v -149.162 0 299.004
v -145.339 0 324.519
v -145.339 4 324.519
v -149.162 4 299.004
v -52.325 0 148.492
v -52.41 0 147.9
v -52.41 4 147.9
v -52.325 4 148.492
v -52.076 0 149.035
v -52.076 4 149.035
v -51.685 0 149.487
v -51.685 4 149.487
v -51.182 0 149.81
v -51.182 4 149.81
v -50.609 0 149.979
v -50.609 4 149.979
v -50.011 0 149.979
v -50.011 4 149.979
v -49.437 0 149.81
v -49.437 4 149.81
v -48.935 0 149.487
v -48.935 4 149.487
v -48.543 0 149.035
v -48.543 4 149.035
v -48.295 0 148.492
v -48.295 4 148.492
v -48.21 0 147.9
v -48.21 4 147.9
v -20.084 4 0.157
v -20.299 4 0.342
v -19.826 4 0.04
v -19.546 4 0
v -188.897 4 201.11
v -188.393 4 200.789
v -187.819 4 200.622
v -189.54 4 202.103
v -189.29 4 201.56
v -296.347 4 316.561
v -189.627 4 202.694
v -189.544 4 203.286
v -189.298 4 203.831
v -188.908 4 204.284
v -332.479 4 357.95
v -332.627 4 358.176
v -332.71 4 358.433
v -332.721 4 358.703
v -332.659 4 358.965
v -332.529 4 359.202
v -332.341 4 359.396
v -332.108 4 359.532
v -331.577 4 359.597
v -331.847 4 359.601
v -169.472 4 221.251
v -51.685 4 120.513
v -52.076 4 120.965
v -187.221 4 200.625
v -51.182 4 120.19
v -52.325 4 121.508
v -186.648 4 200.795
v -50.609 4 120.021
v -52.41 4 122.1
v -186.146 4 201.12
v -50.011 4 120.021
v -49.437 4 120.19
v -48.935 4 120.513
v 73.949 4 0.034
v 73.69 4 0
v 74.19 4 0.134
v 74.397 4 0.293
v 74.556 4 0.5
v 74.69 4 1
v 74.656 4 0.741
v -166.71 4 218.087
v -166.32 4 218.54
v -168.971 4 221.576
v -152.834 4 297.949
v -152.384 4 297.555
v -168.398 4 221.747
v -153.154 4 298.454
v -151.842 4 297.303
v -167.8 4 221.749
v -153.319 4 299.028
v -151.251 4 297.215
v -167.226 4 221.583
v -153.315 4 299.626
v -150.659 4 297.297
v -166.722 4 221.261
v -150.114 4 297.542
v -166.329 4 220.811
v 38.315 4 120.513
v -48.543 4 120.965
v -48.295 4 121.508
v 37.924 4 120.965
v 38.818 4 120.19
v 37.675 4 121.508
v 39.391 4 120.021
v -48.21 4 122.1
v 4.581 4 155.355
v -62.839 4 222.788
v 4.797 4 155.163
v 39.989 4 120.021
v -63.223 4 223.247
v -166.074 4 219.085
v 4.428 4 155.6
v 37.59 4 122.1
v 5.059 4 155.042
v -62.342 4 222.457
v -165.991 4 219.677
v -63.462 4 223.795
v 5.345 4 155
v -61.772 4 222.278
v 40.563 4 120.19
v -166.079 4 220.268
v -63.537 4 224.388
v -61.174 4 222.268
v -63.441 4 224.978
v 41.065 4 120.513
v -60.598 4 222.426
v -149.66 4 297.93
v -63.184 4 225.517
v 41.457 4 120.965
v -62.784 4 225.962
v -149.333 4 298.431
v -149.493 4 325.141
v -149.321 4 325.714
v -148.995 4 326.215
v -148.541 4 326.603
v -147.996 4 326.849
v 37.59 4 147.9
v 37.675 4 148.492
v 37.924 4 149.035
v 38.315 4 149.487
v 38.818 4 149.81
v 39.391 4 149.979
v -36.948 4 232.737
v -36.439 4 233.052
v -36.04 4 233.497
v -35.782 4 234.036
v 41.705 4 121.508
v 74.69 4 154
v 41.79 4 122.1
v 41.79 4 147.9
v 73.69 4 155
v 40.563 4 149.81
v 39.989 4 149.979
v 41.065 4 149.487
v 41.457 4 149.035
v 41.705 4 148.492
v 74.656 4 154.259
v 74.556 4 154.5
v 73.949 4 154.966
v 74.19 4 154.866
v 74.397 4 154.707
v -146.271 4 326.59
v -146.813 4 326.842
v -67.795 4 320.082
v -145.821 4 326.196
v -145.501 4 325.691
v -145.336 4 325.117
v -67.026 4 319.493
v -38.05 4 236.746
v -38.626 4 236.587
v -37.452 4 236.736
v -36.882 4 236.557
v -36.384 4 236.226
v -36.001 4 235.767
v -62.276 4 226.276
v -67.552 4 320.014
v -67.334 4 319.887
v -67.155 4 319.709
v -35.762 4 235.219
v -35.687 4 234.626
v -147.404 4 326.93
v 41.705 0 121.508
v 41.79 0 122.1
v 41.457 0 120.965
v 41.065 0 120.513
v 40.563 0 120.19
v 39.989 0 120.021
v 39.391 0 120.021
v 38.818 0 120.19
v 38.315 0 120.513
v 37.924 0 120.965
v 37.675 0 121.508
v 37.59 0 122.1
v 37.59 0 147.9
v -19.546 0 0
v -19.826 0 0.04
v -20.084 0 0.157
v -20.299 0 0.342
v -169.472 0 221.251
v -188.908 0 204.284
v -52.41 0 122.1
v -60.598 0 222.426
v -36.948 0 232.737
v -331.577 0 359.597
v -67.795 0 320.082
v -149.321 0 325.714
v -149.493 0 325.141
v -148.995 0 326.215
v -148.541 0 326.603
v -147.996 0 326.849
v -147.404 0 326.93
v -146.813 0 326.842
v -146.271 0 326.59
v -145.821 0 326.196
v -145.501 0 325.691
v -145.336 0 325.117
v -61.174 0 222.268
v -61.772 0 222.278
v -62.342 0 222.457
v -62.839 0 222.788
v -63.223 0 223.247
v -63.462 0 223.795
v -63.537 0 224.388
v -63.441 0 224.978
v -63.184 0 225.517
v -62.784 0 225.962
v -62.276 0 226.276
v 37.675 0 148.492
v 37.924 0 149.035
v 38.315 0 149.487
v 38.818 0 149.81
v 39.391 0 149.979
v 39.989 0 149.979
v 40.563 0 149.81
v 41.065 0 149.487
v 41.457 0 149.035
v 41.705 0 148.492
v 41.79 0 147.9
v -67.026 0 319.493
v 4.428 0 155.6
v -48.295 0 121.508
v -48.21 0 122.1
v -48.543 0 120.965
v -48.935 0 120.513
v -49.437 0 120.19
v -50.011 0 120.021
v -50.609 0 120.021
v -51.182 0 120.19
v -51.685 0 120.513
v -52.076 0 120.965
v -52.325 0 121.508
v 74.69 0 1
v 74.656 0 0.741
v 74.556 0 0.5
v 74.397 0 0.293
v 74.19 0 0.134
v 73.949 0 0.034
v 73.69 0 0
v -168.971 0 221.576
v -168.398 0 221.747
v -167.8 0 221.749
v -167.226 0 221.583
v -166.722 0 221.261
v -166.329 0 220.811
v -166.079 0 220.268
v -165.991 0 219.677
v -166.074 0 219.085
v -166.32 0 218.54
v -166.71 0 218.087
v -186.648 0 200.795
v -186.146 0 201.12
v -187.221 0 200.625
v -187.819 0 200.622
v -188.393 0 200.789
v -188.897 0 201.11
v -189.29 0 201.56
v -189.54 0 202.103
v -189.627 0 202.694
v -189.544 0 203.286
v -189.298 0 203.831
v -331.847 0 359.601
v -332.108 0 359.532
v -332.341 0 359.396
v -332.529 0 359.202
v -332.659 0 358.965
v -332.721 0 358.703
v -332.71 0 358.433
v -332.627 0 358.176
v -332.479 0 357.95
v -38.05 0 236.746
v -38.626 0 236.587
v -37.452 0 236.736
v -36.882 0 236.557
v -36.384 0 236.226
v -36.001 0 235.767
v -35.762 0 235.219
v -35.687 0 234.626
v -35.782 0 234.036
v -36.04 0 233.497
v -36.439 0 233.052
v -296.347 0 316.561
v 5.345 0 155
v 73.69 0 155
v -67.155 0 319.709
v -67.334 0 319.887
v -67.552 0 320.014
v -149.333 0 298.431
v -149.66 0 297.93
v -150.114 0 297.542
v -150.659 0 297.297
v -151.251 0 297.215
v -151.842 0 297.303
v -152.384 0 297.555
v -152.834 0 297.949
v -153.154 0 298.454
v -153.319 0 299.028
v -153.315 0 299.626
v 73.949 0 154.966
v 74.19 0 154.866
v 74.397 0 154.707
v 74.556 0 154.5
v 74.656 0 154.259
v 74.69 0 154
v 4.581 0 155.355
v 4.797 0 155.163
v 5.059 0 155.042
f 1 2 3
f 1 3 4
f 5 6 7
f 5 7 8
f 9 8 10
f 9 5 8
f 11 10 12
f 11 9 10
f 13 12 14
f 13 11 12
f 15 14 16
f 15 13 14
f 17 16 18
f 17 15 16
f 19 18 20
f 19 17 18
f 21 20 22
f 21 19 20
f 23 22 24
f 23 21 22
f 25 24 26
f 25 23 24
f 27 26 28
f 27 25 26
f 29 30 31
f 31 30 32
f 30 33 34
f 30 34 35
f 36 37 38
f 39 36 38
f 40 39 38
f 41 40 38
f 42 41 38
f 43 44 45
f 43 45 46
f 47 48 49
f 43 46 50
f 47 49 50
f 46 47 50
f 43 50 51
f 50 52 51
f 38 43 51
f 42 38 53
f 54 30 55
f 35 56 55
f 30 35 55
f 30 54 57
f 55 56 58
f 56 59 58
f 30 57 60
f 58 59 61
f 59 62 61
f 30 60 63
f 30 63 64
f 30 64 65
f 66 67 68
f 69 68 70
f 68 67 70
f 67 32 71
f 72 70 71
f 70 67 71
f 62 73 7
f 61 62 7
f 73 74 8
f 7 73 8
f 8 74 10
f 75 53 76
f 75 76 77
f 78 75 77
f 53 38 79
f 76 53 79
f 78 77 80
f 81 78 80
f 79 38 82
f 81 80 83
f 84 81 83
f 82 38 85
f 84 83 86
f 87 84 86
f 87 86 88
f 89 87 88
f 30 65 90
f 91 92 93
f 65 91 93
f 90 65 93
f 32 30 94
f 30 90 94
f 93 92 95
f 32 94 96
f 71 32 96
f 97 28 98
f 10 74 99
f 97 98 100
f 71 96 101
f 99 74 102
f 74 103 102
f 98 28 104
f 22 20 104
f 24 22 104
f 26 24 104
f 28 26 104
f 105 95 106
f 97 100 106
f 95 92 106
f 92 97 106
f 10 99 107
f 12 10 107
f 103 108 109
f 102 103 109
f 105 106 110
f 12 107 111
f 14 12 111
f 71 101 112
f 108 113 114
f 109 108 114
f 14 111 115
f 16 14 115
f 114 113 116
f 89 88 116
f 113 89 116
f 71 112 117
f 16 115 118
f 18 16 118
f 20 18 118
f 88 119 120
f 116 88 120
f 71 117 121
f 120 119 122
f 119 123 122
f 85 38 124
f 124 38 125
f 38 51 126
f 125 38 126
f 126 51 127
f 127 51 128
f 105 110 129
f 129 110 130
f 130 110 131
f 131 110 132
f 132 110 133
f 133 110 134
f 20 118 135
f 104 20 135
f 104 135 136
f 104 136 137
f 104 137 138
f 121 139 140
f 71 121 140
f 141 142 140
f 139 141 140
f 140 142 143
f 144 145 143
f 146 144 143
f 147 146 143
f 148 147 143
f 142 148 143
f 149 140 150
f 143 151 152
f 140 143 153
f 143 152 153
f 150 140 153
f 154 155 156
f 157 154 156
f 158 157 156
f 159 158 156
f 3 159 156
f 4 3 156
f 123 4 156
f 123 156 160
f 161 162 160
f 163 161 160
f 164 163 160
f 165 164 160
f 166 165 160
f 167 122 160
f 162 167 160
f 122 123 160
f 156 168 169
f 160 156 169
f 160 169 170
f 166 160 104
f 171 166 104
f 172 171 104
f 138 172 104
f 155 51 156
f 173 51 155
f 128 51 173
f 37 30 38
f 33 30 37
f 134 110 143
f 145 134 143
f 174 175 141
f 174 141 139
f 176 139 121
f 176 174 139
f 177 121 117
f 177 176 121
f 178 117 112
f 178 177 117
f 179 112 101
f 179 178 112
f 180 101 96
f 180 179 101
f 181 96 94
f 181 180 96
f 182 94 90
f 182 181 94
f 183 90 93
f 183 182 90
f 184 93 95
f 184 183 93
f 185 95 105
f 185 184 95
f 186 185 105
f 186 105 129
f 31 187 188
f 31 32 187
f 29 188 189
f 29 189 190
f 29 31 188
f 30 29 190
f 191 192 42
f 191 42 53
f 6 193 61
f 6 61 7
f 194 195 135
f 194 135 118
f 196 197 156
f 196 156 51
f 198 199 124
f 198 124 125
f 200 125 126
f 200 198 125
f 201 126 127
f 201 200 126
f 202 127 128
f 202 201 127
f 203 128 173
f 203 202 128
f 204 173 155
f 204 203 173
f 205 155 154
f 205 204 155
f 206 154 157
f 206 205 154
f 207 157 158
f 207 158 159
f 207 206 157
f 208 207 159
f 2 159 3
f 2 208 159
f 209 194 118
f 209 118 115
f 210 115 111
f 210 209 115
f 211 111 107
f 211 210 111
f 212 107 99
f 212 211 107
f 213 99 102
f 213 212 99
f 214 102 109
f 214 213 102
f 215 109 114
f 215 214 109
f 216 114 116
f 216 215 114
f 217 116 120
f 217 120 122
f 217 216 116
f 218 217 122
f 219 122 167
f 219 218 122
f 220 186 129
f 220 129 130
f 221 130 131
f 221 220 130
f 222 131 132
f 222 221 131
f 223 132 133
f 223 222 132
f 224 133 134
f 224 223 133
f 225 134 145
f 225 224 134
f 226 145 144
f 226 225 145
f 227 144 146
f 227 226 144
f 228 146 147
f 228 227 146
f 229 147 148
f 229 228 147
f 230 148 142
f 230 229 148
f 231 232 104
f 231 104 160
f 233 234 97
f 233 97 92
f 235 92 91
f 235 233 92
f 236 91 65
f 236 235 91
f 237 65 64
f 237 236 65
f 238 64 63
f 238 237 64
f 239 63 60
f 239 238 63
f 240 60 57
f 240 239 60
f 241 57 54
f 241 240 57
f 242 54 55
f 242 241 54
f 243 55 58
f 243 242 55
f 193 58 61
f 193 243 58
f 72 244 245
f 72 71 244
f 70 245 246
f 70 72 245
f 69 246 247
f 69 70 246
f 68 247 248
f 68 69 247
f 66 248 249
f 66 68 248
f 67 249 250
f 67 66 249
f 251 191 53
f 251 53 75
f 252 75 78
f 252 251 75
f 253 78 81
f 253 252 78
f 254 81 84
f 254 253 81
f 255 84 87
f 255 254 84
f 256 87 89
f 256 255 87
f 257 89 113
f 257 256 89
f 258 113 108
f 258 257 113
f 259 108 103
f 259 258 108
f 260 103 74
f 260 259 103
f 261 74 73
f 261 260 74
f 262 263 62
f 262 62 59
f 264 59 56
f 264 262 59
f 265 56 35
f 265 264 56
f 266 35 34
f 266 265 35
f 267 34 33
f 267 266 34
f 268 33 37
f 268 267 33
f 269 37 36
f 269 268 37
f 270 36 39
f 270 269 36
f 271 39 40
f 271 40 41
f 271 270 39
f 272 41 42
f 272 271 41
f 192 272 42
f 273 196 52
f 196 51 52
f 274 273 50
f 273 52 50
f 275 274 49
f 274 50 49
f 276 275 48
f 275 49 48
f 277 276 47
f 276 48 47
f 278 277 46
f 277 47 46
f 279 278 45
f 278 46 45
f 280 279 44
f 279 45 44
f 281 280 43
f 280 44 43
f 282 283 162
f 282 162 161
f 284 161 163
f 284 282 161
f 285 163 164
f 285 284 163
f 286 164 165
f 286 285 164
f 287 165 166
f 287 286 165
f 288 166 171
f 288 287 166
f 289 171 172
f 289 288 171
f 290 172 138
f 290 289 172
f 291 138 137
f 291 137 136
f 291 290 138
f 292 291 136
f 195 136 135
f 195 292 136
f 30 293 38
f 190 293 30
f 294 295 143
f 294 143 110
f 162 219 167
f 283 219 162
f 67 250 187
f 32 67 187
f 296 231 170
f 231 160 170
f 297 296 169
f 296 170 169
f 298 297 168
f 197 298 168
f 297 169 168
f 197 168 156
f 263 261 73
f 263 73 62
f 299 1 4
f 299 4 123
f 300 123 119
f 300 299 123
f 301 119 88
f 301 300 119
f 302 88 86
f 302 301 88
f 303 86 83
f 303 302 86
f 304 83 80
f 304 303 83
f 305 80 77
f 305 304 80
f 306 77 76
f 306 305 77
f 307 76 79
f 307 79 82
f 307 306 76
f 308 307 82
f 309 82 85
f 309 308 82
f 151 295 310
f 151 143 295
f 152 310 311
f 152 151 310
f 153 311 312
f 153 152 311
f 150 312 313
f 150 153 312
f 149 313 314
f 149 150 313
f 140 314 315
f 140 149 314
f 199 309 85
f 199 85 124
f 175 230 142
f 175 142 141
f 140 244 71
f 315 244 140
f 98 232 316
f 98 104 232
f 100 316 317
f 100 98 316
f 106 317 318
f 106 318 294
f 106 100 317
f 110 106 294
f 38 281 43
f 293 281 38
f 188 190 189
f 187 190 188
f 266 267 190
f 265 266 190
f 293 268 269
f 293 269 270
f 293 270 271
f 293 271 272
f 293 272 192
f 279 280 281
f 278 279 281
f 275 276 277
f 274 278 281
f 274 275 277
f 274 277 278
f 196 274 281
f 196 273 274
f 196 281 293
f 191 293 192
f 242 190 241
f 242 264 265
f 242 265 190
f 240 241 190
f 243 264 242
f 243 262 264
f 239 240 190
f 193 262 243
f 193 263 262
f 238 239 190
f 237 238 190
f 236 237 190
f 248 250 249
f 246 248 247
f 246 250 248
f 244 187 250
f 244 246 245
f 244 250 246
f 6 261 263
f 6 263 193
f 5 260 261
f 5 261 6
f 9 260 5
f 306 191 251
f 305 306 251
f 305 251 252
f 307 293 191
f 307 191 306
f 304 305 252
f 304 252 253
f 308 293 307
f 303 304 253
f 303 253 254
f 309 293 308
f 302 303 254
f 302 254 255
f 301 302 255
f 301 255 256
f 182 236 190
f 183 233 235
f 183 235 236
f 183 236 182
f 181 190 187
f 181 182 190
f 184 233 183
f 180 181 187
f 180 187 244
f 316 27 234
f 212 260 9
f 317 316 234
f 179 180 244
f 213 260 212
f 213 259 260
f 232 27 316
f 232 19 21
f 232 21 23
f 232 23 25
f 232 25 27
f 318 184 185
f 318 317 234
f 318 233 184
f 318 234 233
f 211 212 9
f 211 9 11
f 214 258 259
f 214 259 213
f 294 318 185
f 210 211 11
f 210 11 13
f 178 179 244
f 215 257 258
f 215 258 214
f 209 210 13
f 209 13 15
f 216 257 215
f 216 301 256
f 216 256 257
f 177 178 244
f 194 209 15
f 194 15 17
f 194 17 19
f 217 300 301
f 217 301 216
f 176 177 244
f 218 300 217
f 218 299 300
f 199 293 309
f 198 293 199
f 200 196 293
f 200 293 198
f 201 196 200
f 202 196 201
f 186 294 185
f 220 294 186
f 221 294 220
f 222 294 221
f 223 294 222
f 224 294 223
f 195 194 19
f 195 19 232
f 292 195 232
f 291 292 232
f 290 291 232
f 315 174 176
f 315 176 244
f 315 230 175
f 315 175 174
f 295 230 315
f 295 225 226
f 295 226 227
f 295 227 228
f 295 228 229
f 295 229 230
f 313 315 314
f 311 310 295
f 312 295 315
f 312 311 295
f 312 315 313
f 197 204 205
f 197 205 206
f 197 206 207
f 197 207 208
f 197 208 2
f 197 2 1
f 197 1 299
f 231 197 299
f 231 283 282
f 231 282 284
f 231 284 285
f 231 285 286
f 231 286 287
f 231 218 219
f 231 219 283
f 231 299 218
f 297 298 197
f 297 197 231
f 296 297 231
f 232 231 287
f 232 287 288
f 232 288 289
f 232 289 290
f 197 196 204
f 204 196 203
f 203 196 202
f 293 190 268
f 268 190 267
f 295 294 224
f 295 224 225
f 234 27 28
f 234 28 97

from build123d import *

# Parameters (mm, degrees)
BOSS_EXTRUDE1_DEPTH = 4
FILLET1_R           = 1


with BuildPart() as part:
    # Sketch2 → Boss-Extrude1 (new body)
    with BuildSketch(Plane(origin=(0, 0, 0), x_dir=(-1, 0, 0), z_dir=(0, 1, 0))):
        Polygon((-4.690238769, 155), (67.247234081, 320), (334.267832537, 360), (296.347290812, 316.561271604), (20, 0), (0, 0), (-74.690238769, 0), (-74.690238769, 155), align=None)
        with BuildLine():
            Line((-41.790238769, 147.9), (-41.790238769, 122.1))
            ThreePointArc((-41.790238769, 122.1), (-39.690238769, 120), (-37.590238769, 122.1))
            Line((-37.590238769, 122.1), (-37.590238769, 147.9))
            ThreePointArc((-37.590238769, 147.9), (-39.690238769, 150), (-41.790238769, 147.9))
        make_face(mode=Mode.SUBTRACT)
        with BuildLine():
            Line((36.947560473, 232.737466349), (60.597560473, 222.426428574))
            ThreePointArc((60.597560473, 222.426428574), (63.36183099, 223.512158057), (62.276101506, 226.276428574))
            Line((62.276101506, 226.276428574), (38.626101506, 236.587466349))
            ThreePointArc((38.626101506, 236.587466349), (35.86183099, 235.501736865), (36.947560473, 232.737466349))
        make_face(mode=Mode.SUBTRACT)
        with BuildLine():
            Line((48.209761231, 147.9), (48.209761231, 122.1))
            ThreePointArc((48.209761231, 122.1), (50.309761231, 120), (52.409761231, 122.1))
            Line((52.409761231, 122.1), (52.409761231, 147.9))
            ThreePointArc((52.409761231, 147.9), (50.309761231, 150), (48.209761231, 147.9))
        make_face(mode=Mode.SUBTRACT)
        with BuildLine():
            Line((145.339473414, 324.519087967), (149.161695636, 299.003786336))
            ThreePointArc((149.161695636, 299.003786336), (151.549633624, 297.23807057), (153.31534939, 299.626008558))
            Line((153.31534939, 299.626008558), (149.493127167, 325.141310189))
            ThreePointArc((149.493127167, 325.141310189), (147.105189179, 326.907025955), (145.339473414, 324.519087967))
        make_face(mode=Mode.SUBTRACT)
        with BuildLine():
            Line((166.710229804, 218.087105004), (186.146285223, 201.120085532))
            ThreePointArc((186.146285223, 201.120085532), (189.109326203, 201.321053574), (188.908358161, 204.284094554))
            Line((188.908358161, 204.284094554), (169.472302741, 221.251114025))
            ThreePointArc((169.472302741, 221.251114025), (166.509261762, 221.050145983), (166.710229804, 218.087105004))
        make_face(mode=Mode.SUBTRACT)
    extrude(amount=BOSS_EXTRUDE1_DEPTH)

    # Fillet1
    fillet1_edges = [part.edges().sort_by_distance(p)[0] for p in [
        (-20, 2, 0),
        (74.690238769, 2, 0),
        (74.690238769, 2, 155),
        (4.690238769, 2, 155),
        (-67.247234081, 2, 320),
        (-334.267832537, 2, 360),
    ]]
    fillet(fillet1_edges, radius=FILLET1_R)


solid = part.part
